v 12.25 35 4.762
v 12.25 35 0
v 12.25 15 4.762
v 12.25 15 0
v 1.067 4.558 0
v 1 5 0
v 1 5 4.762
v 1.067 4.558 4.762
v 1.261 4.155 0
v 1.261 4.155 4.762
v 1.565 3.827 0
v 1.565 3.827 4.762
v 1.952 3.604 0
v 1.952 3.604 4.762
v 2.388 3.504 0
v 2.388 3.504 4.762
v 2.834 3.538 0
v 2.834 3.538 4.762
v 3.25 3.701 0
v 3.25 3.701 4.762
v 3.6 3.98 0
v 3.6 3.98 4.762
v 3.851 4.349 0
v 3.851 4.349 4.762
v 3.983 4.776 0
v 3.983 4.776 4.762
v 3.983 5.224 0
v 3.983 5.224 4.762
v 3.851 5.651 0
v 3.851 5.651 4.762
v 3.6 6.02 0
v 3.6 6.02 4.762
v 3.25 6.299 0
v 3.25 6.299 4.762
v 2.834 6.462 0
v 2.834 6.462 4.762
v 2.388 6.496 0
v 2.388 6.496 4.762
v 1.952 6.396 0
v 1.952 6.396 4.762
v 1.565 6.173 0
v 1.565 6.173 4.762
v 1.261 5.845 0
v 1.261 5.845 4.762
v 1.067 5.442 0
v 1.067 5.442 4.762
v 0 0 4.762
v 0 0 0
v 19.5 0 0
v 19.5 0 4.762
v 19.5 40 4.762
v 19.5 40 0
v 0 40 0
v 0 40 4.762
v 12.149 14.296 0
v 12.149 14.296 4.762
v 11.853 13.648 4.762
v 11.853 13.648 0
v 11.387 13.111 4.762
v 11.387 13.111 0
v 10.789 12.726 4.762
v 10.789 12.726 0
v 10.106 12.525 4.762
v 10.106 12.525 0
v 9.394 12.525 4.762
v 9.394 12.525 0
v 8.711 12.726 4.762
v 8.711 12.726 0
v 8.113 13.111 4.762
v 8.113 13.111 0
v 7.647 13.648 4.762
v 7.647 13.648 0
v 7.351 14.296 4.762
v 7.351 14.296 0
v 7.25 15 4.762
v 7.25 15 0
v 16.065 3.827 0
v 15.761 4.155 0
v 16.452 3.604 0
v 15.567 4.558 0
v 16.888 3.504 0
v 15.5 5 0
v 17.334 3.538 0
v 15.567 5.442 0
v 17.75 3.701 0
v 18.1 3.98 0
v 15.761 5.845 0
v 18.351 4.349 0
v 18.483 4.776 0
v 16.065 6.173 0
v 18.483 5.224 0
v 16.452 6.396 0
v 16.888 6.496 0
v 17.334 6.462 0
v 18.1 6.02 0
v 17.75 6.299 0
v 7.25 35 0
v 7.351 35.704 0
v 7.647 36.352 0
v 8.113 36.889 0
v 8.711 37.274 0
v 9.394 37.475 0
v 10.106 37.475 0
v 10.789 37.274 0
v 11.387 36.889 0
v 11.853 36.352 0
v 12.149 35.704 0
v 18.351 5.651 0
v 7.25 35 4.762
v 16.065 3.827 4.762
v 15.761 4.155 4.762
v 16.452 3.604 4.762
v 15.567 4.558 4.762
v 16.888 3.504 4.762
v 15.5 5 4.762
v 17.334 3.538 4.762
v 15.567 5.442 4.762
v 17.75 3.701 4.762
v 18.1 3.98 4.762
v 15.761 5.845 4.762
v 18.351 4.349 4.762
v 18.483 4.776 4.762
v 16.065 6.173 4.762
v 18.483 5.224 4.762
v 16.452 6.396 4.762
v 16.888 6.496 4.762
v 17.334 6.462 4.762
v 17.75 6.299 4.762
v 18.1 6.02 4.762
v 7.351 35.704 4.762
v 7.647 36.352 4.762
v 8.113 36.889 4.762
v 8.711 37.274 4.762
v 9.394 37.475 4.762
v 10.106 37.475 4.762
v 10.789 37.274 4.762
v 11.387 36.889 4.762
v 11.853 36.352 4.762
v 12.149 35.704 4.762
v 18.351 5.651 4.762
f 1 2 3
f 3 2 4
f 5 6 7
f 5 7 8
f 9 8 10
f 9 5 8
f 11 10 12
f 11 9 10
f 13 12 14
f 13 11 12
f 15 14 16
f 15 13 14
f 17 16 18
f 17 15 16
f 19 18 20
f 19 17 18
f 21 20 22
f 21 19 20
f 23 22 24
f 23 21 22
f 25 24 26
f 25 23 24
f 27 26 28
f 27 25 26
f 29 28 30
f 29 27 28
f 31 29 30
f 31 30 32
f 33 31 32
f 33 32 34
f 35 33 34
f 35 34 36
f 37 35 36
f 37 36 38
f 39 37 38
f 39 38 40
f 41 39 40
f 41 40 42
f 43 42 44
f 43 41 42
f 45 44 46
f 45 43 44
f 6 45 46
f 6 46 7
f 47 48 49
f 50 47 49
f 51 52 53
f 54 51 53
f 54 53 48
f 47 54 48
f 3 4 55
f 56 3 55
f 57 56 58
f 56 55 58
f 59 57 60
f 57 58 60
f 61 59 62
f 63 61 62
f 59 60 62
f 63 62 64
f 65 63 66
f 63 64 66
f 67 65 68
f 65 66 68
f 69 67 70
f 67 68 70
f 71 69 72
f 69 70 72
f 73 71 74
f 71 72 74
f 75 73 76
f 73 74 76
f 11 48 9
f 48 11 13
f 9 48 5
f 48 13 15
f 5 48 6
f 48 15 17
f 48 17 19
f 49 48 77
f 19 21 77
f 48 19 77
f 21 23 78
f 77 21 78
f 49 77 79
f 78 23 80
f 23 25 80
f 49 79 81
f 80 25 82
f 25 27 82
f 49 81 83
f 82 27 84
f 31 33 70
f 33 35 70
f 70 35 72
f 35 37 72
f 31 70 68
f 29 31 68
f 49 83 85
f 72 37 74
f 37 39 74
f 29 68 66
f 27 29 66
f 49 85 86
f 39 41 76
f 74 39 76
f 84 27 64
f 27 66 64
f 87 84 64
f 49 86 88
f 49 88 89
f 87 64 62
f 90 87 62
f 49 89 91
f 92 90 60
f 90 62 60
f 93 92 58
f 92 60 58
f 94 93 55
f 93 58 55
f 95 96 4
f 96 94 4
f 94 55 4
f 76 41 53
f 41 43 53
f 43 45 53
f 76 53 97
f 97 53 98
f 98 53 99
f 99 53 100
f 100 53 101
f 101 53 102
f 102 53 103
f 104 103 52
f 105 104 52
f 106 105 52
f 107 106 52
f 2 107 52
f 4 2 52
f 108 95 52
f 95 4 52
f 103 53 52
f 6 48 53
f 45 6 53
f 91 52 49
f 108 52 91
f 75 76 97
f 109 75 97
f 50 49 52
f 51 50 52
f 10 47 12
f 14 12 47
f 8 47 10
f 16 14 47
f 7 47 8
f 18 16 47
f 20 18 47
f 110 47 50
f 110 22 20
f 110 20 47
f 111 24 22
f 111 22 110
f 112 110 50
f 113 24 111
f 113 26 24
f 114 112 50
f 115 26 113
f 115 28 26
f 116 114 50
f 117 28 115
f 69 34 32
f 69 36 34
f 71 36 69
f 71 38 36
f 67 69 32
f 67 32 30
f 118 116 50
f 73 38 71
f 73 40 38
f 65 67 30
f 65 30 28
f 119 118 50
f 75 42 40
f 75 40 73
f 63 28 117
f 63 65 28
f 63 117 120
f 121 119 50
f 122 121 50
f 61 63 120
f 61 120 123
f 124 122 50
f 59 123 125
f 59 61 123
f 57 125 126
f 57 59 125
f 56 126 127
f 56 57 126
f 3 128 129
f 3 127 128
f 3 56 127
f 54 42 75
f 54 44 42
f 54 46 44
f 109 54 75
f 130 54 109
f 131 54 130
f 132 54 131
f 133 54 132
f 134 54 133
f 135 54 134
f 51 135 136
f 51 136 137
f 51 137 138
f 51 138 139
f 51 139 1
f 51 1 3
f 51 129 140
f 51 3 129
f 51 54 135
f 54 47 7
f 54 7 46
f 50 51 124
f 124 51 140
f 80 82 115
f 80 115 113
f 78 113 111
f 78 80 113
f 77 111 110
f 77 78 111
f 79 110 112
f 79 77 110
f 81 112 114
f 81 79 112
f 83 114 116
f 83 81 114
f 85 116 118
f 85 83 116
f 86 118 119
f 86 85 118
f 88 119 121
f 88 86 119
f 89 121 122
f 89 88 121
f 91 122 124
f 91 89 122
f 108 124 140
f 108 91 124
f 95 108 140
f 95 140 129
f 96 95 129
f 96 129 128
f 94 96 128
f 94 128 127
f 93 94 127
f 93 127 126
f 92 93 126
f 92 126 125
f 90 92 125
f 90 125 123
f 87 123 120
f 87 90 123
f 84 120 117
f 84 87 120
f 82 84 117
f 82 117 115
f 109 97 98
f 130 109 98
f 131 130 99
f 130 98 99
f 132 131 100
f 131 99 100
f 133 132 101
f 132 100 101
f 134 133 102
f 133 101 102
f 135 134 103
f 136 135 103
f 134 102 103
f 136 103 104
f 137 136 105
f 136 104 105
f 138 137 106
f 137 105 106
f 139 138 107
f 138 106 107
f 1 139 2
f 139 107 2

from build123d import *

# Parameters (mm, degrees)
SKETCH1_4_W         = 19.5
SKETCH1_4_H         = 40
SKETCH1_4_R         = 1.5
BOSS_EXTRUDE3_DEPTH = 4.7625


with BuildPart() as part:
    # Sketch1<4> → Boss-Extrude3 (new body)
    with BuildSketch(Plane.XY):
        with Locations((9.75, 20)):
            Rectangle(SKETCH1_4_W, SKETCH1_4_H)
        with Locations((2.5, 5)):
            Circle(SKETCH1_4_R, mode=Mode.SUBTRACT)
        with Locations((17, 5)):
            Circle(SKETCH1_4_R, mode=Mode.SUBTRACT)
        with BuildLine():
            ThreePointArc((12.25, 15), (9.749999989, 12.5), (7.25, 15.000000022))
            Line((7.25, 15.000000022), (7.25, 35))
            ThreePointArc((7.25, 35), (9.75, 37.5), (12.25, 35))
            Line((12.25, 35), (12.25, 15))
        make_face(mode=Mode.SUBTRACT)
    extrude(amount=BOSS_EXTRUDE3_DEPTH)


solid = part.part
